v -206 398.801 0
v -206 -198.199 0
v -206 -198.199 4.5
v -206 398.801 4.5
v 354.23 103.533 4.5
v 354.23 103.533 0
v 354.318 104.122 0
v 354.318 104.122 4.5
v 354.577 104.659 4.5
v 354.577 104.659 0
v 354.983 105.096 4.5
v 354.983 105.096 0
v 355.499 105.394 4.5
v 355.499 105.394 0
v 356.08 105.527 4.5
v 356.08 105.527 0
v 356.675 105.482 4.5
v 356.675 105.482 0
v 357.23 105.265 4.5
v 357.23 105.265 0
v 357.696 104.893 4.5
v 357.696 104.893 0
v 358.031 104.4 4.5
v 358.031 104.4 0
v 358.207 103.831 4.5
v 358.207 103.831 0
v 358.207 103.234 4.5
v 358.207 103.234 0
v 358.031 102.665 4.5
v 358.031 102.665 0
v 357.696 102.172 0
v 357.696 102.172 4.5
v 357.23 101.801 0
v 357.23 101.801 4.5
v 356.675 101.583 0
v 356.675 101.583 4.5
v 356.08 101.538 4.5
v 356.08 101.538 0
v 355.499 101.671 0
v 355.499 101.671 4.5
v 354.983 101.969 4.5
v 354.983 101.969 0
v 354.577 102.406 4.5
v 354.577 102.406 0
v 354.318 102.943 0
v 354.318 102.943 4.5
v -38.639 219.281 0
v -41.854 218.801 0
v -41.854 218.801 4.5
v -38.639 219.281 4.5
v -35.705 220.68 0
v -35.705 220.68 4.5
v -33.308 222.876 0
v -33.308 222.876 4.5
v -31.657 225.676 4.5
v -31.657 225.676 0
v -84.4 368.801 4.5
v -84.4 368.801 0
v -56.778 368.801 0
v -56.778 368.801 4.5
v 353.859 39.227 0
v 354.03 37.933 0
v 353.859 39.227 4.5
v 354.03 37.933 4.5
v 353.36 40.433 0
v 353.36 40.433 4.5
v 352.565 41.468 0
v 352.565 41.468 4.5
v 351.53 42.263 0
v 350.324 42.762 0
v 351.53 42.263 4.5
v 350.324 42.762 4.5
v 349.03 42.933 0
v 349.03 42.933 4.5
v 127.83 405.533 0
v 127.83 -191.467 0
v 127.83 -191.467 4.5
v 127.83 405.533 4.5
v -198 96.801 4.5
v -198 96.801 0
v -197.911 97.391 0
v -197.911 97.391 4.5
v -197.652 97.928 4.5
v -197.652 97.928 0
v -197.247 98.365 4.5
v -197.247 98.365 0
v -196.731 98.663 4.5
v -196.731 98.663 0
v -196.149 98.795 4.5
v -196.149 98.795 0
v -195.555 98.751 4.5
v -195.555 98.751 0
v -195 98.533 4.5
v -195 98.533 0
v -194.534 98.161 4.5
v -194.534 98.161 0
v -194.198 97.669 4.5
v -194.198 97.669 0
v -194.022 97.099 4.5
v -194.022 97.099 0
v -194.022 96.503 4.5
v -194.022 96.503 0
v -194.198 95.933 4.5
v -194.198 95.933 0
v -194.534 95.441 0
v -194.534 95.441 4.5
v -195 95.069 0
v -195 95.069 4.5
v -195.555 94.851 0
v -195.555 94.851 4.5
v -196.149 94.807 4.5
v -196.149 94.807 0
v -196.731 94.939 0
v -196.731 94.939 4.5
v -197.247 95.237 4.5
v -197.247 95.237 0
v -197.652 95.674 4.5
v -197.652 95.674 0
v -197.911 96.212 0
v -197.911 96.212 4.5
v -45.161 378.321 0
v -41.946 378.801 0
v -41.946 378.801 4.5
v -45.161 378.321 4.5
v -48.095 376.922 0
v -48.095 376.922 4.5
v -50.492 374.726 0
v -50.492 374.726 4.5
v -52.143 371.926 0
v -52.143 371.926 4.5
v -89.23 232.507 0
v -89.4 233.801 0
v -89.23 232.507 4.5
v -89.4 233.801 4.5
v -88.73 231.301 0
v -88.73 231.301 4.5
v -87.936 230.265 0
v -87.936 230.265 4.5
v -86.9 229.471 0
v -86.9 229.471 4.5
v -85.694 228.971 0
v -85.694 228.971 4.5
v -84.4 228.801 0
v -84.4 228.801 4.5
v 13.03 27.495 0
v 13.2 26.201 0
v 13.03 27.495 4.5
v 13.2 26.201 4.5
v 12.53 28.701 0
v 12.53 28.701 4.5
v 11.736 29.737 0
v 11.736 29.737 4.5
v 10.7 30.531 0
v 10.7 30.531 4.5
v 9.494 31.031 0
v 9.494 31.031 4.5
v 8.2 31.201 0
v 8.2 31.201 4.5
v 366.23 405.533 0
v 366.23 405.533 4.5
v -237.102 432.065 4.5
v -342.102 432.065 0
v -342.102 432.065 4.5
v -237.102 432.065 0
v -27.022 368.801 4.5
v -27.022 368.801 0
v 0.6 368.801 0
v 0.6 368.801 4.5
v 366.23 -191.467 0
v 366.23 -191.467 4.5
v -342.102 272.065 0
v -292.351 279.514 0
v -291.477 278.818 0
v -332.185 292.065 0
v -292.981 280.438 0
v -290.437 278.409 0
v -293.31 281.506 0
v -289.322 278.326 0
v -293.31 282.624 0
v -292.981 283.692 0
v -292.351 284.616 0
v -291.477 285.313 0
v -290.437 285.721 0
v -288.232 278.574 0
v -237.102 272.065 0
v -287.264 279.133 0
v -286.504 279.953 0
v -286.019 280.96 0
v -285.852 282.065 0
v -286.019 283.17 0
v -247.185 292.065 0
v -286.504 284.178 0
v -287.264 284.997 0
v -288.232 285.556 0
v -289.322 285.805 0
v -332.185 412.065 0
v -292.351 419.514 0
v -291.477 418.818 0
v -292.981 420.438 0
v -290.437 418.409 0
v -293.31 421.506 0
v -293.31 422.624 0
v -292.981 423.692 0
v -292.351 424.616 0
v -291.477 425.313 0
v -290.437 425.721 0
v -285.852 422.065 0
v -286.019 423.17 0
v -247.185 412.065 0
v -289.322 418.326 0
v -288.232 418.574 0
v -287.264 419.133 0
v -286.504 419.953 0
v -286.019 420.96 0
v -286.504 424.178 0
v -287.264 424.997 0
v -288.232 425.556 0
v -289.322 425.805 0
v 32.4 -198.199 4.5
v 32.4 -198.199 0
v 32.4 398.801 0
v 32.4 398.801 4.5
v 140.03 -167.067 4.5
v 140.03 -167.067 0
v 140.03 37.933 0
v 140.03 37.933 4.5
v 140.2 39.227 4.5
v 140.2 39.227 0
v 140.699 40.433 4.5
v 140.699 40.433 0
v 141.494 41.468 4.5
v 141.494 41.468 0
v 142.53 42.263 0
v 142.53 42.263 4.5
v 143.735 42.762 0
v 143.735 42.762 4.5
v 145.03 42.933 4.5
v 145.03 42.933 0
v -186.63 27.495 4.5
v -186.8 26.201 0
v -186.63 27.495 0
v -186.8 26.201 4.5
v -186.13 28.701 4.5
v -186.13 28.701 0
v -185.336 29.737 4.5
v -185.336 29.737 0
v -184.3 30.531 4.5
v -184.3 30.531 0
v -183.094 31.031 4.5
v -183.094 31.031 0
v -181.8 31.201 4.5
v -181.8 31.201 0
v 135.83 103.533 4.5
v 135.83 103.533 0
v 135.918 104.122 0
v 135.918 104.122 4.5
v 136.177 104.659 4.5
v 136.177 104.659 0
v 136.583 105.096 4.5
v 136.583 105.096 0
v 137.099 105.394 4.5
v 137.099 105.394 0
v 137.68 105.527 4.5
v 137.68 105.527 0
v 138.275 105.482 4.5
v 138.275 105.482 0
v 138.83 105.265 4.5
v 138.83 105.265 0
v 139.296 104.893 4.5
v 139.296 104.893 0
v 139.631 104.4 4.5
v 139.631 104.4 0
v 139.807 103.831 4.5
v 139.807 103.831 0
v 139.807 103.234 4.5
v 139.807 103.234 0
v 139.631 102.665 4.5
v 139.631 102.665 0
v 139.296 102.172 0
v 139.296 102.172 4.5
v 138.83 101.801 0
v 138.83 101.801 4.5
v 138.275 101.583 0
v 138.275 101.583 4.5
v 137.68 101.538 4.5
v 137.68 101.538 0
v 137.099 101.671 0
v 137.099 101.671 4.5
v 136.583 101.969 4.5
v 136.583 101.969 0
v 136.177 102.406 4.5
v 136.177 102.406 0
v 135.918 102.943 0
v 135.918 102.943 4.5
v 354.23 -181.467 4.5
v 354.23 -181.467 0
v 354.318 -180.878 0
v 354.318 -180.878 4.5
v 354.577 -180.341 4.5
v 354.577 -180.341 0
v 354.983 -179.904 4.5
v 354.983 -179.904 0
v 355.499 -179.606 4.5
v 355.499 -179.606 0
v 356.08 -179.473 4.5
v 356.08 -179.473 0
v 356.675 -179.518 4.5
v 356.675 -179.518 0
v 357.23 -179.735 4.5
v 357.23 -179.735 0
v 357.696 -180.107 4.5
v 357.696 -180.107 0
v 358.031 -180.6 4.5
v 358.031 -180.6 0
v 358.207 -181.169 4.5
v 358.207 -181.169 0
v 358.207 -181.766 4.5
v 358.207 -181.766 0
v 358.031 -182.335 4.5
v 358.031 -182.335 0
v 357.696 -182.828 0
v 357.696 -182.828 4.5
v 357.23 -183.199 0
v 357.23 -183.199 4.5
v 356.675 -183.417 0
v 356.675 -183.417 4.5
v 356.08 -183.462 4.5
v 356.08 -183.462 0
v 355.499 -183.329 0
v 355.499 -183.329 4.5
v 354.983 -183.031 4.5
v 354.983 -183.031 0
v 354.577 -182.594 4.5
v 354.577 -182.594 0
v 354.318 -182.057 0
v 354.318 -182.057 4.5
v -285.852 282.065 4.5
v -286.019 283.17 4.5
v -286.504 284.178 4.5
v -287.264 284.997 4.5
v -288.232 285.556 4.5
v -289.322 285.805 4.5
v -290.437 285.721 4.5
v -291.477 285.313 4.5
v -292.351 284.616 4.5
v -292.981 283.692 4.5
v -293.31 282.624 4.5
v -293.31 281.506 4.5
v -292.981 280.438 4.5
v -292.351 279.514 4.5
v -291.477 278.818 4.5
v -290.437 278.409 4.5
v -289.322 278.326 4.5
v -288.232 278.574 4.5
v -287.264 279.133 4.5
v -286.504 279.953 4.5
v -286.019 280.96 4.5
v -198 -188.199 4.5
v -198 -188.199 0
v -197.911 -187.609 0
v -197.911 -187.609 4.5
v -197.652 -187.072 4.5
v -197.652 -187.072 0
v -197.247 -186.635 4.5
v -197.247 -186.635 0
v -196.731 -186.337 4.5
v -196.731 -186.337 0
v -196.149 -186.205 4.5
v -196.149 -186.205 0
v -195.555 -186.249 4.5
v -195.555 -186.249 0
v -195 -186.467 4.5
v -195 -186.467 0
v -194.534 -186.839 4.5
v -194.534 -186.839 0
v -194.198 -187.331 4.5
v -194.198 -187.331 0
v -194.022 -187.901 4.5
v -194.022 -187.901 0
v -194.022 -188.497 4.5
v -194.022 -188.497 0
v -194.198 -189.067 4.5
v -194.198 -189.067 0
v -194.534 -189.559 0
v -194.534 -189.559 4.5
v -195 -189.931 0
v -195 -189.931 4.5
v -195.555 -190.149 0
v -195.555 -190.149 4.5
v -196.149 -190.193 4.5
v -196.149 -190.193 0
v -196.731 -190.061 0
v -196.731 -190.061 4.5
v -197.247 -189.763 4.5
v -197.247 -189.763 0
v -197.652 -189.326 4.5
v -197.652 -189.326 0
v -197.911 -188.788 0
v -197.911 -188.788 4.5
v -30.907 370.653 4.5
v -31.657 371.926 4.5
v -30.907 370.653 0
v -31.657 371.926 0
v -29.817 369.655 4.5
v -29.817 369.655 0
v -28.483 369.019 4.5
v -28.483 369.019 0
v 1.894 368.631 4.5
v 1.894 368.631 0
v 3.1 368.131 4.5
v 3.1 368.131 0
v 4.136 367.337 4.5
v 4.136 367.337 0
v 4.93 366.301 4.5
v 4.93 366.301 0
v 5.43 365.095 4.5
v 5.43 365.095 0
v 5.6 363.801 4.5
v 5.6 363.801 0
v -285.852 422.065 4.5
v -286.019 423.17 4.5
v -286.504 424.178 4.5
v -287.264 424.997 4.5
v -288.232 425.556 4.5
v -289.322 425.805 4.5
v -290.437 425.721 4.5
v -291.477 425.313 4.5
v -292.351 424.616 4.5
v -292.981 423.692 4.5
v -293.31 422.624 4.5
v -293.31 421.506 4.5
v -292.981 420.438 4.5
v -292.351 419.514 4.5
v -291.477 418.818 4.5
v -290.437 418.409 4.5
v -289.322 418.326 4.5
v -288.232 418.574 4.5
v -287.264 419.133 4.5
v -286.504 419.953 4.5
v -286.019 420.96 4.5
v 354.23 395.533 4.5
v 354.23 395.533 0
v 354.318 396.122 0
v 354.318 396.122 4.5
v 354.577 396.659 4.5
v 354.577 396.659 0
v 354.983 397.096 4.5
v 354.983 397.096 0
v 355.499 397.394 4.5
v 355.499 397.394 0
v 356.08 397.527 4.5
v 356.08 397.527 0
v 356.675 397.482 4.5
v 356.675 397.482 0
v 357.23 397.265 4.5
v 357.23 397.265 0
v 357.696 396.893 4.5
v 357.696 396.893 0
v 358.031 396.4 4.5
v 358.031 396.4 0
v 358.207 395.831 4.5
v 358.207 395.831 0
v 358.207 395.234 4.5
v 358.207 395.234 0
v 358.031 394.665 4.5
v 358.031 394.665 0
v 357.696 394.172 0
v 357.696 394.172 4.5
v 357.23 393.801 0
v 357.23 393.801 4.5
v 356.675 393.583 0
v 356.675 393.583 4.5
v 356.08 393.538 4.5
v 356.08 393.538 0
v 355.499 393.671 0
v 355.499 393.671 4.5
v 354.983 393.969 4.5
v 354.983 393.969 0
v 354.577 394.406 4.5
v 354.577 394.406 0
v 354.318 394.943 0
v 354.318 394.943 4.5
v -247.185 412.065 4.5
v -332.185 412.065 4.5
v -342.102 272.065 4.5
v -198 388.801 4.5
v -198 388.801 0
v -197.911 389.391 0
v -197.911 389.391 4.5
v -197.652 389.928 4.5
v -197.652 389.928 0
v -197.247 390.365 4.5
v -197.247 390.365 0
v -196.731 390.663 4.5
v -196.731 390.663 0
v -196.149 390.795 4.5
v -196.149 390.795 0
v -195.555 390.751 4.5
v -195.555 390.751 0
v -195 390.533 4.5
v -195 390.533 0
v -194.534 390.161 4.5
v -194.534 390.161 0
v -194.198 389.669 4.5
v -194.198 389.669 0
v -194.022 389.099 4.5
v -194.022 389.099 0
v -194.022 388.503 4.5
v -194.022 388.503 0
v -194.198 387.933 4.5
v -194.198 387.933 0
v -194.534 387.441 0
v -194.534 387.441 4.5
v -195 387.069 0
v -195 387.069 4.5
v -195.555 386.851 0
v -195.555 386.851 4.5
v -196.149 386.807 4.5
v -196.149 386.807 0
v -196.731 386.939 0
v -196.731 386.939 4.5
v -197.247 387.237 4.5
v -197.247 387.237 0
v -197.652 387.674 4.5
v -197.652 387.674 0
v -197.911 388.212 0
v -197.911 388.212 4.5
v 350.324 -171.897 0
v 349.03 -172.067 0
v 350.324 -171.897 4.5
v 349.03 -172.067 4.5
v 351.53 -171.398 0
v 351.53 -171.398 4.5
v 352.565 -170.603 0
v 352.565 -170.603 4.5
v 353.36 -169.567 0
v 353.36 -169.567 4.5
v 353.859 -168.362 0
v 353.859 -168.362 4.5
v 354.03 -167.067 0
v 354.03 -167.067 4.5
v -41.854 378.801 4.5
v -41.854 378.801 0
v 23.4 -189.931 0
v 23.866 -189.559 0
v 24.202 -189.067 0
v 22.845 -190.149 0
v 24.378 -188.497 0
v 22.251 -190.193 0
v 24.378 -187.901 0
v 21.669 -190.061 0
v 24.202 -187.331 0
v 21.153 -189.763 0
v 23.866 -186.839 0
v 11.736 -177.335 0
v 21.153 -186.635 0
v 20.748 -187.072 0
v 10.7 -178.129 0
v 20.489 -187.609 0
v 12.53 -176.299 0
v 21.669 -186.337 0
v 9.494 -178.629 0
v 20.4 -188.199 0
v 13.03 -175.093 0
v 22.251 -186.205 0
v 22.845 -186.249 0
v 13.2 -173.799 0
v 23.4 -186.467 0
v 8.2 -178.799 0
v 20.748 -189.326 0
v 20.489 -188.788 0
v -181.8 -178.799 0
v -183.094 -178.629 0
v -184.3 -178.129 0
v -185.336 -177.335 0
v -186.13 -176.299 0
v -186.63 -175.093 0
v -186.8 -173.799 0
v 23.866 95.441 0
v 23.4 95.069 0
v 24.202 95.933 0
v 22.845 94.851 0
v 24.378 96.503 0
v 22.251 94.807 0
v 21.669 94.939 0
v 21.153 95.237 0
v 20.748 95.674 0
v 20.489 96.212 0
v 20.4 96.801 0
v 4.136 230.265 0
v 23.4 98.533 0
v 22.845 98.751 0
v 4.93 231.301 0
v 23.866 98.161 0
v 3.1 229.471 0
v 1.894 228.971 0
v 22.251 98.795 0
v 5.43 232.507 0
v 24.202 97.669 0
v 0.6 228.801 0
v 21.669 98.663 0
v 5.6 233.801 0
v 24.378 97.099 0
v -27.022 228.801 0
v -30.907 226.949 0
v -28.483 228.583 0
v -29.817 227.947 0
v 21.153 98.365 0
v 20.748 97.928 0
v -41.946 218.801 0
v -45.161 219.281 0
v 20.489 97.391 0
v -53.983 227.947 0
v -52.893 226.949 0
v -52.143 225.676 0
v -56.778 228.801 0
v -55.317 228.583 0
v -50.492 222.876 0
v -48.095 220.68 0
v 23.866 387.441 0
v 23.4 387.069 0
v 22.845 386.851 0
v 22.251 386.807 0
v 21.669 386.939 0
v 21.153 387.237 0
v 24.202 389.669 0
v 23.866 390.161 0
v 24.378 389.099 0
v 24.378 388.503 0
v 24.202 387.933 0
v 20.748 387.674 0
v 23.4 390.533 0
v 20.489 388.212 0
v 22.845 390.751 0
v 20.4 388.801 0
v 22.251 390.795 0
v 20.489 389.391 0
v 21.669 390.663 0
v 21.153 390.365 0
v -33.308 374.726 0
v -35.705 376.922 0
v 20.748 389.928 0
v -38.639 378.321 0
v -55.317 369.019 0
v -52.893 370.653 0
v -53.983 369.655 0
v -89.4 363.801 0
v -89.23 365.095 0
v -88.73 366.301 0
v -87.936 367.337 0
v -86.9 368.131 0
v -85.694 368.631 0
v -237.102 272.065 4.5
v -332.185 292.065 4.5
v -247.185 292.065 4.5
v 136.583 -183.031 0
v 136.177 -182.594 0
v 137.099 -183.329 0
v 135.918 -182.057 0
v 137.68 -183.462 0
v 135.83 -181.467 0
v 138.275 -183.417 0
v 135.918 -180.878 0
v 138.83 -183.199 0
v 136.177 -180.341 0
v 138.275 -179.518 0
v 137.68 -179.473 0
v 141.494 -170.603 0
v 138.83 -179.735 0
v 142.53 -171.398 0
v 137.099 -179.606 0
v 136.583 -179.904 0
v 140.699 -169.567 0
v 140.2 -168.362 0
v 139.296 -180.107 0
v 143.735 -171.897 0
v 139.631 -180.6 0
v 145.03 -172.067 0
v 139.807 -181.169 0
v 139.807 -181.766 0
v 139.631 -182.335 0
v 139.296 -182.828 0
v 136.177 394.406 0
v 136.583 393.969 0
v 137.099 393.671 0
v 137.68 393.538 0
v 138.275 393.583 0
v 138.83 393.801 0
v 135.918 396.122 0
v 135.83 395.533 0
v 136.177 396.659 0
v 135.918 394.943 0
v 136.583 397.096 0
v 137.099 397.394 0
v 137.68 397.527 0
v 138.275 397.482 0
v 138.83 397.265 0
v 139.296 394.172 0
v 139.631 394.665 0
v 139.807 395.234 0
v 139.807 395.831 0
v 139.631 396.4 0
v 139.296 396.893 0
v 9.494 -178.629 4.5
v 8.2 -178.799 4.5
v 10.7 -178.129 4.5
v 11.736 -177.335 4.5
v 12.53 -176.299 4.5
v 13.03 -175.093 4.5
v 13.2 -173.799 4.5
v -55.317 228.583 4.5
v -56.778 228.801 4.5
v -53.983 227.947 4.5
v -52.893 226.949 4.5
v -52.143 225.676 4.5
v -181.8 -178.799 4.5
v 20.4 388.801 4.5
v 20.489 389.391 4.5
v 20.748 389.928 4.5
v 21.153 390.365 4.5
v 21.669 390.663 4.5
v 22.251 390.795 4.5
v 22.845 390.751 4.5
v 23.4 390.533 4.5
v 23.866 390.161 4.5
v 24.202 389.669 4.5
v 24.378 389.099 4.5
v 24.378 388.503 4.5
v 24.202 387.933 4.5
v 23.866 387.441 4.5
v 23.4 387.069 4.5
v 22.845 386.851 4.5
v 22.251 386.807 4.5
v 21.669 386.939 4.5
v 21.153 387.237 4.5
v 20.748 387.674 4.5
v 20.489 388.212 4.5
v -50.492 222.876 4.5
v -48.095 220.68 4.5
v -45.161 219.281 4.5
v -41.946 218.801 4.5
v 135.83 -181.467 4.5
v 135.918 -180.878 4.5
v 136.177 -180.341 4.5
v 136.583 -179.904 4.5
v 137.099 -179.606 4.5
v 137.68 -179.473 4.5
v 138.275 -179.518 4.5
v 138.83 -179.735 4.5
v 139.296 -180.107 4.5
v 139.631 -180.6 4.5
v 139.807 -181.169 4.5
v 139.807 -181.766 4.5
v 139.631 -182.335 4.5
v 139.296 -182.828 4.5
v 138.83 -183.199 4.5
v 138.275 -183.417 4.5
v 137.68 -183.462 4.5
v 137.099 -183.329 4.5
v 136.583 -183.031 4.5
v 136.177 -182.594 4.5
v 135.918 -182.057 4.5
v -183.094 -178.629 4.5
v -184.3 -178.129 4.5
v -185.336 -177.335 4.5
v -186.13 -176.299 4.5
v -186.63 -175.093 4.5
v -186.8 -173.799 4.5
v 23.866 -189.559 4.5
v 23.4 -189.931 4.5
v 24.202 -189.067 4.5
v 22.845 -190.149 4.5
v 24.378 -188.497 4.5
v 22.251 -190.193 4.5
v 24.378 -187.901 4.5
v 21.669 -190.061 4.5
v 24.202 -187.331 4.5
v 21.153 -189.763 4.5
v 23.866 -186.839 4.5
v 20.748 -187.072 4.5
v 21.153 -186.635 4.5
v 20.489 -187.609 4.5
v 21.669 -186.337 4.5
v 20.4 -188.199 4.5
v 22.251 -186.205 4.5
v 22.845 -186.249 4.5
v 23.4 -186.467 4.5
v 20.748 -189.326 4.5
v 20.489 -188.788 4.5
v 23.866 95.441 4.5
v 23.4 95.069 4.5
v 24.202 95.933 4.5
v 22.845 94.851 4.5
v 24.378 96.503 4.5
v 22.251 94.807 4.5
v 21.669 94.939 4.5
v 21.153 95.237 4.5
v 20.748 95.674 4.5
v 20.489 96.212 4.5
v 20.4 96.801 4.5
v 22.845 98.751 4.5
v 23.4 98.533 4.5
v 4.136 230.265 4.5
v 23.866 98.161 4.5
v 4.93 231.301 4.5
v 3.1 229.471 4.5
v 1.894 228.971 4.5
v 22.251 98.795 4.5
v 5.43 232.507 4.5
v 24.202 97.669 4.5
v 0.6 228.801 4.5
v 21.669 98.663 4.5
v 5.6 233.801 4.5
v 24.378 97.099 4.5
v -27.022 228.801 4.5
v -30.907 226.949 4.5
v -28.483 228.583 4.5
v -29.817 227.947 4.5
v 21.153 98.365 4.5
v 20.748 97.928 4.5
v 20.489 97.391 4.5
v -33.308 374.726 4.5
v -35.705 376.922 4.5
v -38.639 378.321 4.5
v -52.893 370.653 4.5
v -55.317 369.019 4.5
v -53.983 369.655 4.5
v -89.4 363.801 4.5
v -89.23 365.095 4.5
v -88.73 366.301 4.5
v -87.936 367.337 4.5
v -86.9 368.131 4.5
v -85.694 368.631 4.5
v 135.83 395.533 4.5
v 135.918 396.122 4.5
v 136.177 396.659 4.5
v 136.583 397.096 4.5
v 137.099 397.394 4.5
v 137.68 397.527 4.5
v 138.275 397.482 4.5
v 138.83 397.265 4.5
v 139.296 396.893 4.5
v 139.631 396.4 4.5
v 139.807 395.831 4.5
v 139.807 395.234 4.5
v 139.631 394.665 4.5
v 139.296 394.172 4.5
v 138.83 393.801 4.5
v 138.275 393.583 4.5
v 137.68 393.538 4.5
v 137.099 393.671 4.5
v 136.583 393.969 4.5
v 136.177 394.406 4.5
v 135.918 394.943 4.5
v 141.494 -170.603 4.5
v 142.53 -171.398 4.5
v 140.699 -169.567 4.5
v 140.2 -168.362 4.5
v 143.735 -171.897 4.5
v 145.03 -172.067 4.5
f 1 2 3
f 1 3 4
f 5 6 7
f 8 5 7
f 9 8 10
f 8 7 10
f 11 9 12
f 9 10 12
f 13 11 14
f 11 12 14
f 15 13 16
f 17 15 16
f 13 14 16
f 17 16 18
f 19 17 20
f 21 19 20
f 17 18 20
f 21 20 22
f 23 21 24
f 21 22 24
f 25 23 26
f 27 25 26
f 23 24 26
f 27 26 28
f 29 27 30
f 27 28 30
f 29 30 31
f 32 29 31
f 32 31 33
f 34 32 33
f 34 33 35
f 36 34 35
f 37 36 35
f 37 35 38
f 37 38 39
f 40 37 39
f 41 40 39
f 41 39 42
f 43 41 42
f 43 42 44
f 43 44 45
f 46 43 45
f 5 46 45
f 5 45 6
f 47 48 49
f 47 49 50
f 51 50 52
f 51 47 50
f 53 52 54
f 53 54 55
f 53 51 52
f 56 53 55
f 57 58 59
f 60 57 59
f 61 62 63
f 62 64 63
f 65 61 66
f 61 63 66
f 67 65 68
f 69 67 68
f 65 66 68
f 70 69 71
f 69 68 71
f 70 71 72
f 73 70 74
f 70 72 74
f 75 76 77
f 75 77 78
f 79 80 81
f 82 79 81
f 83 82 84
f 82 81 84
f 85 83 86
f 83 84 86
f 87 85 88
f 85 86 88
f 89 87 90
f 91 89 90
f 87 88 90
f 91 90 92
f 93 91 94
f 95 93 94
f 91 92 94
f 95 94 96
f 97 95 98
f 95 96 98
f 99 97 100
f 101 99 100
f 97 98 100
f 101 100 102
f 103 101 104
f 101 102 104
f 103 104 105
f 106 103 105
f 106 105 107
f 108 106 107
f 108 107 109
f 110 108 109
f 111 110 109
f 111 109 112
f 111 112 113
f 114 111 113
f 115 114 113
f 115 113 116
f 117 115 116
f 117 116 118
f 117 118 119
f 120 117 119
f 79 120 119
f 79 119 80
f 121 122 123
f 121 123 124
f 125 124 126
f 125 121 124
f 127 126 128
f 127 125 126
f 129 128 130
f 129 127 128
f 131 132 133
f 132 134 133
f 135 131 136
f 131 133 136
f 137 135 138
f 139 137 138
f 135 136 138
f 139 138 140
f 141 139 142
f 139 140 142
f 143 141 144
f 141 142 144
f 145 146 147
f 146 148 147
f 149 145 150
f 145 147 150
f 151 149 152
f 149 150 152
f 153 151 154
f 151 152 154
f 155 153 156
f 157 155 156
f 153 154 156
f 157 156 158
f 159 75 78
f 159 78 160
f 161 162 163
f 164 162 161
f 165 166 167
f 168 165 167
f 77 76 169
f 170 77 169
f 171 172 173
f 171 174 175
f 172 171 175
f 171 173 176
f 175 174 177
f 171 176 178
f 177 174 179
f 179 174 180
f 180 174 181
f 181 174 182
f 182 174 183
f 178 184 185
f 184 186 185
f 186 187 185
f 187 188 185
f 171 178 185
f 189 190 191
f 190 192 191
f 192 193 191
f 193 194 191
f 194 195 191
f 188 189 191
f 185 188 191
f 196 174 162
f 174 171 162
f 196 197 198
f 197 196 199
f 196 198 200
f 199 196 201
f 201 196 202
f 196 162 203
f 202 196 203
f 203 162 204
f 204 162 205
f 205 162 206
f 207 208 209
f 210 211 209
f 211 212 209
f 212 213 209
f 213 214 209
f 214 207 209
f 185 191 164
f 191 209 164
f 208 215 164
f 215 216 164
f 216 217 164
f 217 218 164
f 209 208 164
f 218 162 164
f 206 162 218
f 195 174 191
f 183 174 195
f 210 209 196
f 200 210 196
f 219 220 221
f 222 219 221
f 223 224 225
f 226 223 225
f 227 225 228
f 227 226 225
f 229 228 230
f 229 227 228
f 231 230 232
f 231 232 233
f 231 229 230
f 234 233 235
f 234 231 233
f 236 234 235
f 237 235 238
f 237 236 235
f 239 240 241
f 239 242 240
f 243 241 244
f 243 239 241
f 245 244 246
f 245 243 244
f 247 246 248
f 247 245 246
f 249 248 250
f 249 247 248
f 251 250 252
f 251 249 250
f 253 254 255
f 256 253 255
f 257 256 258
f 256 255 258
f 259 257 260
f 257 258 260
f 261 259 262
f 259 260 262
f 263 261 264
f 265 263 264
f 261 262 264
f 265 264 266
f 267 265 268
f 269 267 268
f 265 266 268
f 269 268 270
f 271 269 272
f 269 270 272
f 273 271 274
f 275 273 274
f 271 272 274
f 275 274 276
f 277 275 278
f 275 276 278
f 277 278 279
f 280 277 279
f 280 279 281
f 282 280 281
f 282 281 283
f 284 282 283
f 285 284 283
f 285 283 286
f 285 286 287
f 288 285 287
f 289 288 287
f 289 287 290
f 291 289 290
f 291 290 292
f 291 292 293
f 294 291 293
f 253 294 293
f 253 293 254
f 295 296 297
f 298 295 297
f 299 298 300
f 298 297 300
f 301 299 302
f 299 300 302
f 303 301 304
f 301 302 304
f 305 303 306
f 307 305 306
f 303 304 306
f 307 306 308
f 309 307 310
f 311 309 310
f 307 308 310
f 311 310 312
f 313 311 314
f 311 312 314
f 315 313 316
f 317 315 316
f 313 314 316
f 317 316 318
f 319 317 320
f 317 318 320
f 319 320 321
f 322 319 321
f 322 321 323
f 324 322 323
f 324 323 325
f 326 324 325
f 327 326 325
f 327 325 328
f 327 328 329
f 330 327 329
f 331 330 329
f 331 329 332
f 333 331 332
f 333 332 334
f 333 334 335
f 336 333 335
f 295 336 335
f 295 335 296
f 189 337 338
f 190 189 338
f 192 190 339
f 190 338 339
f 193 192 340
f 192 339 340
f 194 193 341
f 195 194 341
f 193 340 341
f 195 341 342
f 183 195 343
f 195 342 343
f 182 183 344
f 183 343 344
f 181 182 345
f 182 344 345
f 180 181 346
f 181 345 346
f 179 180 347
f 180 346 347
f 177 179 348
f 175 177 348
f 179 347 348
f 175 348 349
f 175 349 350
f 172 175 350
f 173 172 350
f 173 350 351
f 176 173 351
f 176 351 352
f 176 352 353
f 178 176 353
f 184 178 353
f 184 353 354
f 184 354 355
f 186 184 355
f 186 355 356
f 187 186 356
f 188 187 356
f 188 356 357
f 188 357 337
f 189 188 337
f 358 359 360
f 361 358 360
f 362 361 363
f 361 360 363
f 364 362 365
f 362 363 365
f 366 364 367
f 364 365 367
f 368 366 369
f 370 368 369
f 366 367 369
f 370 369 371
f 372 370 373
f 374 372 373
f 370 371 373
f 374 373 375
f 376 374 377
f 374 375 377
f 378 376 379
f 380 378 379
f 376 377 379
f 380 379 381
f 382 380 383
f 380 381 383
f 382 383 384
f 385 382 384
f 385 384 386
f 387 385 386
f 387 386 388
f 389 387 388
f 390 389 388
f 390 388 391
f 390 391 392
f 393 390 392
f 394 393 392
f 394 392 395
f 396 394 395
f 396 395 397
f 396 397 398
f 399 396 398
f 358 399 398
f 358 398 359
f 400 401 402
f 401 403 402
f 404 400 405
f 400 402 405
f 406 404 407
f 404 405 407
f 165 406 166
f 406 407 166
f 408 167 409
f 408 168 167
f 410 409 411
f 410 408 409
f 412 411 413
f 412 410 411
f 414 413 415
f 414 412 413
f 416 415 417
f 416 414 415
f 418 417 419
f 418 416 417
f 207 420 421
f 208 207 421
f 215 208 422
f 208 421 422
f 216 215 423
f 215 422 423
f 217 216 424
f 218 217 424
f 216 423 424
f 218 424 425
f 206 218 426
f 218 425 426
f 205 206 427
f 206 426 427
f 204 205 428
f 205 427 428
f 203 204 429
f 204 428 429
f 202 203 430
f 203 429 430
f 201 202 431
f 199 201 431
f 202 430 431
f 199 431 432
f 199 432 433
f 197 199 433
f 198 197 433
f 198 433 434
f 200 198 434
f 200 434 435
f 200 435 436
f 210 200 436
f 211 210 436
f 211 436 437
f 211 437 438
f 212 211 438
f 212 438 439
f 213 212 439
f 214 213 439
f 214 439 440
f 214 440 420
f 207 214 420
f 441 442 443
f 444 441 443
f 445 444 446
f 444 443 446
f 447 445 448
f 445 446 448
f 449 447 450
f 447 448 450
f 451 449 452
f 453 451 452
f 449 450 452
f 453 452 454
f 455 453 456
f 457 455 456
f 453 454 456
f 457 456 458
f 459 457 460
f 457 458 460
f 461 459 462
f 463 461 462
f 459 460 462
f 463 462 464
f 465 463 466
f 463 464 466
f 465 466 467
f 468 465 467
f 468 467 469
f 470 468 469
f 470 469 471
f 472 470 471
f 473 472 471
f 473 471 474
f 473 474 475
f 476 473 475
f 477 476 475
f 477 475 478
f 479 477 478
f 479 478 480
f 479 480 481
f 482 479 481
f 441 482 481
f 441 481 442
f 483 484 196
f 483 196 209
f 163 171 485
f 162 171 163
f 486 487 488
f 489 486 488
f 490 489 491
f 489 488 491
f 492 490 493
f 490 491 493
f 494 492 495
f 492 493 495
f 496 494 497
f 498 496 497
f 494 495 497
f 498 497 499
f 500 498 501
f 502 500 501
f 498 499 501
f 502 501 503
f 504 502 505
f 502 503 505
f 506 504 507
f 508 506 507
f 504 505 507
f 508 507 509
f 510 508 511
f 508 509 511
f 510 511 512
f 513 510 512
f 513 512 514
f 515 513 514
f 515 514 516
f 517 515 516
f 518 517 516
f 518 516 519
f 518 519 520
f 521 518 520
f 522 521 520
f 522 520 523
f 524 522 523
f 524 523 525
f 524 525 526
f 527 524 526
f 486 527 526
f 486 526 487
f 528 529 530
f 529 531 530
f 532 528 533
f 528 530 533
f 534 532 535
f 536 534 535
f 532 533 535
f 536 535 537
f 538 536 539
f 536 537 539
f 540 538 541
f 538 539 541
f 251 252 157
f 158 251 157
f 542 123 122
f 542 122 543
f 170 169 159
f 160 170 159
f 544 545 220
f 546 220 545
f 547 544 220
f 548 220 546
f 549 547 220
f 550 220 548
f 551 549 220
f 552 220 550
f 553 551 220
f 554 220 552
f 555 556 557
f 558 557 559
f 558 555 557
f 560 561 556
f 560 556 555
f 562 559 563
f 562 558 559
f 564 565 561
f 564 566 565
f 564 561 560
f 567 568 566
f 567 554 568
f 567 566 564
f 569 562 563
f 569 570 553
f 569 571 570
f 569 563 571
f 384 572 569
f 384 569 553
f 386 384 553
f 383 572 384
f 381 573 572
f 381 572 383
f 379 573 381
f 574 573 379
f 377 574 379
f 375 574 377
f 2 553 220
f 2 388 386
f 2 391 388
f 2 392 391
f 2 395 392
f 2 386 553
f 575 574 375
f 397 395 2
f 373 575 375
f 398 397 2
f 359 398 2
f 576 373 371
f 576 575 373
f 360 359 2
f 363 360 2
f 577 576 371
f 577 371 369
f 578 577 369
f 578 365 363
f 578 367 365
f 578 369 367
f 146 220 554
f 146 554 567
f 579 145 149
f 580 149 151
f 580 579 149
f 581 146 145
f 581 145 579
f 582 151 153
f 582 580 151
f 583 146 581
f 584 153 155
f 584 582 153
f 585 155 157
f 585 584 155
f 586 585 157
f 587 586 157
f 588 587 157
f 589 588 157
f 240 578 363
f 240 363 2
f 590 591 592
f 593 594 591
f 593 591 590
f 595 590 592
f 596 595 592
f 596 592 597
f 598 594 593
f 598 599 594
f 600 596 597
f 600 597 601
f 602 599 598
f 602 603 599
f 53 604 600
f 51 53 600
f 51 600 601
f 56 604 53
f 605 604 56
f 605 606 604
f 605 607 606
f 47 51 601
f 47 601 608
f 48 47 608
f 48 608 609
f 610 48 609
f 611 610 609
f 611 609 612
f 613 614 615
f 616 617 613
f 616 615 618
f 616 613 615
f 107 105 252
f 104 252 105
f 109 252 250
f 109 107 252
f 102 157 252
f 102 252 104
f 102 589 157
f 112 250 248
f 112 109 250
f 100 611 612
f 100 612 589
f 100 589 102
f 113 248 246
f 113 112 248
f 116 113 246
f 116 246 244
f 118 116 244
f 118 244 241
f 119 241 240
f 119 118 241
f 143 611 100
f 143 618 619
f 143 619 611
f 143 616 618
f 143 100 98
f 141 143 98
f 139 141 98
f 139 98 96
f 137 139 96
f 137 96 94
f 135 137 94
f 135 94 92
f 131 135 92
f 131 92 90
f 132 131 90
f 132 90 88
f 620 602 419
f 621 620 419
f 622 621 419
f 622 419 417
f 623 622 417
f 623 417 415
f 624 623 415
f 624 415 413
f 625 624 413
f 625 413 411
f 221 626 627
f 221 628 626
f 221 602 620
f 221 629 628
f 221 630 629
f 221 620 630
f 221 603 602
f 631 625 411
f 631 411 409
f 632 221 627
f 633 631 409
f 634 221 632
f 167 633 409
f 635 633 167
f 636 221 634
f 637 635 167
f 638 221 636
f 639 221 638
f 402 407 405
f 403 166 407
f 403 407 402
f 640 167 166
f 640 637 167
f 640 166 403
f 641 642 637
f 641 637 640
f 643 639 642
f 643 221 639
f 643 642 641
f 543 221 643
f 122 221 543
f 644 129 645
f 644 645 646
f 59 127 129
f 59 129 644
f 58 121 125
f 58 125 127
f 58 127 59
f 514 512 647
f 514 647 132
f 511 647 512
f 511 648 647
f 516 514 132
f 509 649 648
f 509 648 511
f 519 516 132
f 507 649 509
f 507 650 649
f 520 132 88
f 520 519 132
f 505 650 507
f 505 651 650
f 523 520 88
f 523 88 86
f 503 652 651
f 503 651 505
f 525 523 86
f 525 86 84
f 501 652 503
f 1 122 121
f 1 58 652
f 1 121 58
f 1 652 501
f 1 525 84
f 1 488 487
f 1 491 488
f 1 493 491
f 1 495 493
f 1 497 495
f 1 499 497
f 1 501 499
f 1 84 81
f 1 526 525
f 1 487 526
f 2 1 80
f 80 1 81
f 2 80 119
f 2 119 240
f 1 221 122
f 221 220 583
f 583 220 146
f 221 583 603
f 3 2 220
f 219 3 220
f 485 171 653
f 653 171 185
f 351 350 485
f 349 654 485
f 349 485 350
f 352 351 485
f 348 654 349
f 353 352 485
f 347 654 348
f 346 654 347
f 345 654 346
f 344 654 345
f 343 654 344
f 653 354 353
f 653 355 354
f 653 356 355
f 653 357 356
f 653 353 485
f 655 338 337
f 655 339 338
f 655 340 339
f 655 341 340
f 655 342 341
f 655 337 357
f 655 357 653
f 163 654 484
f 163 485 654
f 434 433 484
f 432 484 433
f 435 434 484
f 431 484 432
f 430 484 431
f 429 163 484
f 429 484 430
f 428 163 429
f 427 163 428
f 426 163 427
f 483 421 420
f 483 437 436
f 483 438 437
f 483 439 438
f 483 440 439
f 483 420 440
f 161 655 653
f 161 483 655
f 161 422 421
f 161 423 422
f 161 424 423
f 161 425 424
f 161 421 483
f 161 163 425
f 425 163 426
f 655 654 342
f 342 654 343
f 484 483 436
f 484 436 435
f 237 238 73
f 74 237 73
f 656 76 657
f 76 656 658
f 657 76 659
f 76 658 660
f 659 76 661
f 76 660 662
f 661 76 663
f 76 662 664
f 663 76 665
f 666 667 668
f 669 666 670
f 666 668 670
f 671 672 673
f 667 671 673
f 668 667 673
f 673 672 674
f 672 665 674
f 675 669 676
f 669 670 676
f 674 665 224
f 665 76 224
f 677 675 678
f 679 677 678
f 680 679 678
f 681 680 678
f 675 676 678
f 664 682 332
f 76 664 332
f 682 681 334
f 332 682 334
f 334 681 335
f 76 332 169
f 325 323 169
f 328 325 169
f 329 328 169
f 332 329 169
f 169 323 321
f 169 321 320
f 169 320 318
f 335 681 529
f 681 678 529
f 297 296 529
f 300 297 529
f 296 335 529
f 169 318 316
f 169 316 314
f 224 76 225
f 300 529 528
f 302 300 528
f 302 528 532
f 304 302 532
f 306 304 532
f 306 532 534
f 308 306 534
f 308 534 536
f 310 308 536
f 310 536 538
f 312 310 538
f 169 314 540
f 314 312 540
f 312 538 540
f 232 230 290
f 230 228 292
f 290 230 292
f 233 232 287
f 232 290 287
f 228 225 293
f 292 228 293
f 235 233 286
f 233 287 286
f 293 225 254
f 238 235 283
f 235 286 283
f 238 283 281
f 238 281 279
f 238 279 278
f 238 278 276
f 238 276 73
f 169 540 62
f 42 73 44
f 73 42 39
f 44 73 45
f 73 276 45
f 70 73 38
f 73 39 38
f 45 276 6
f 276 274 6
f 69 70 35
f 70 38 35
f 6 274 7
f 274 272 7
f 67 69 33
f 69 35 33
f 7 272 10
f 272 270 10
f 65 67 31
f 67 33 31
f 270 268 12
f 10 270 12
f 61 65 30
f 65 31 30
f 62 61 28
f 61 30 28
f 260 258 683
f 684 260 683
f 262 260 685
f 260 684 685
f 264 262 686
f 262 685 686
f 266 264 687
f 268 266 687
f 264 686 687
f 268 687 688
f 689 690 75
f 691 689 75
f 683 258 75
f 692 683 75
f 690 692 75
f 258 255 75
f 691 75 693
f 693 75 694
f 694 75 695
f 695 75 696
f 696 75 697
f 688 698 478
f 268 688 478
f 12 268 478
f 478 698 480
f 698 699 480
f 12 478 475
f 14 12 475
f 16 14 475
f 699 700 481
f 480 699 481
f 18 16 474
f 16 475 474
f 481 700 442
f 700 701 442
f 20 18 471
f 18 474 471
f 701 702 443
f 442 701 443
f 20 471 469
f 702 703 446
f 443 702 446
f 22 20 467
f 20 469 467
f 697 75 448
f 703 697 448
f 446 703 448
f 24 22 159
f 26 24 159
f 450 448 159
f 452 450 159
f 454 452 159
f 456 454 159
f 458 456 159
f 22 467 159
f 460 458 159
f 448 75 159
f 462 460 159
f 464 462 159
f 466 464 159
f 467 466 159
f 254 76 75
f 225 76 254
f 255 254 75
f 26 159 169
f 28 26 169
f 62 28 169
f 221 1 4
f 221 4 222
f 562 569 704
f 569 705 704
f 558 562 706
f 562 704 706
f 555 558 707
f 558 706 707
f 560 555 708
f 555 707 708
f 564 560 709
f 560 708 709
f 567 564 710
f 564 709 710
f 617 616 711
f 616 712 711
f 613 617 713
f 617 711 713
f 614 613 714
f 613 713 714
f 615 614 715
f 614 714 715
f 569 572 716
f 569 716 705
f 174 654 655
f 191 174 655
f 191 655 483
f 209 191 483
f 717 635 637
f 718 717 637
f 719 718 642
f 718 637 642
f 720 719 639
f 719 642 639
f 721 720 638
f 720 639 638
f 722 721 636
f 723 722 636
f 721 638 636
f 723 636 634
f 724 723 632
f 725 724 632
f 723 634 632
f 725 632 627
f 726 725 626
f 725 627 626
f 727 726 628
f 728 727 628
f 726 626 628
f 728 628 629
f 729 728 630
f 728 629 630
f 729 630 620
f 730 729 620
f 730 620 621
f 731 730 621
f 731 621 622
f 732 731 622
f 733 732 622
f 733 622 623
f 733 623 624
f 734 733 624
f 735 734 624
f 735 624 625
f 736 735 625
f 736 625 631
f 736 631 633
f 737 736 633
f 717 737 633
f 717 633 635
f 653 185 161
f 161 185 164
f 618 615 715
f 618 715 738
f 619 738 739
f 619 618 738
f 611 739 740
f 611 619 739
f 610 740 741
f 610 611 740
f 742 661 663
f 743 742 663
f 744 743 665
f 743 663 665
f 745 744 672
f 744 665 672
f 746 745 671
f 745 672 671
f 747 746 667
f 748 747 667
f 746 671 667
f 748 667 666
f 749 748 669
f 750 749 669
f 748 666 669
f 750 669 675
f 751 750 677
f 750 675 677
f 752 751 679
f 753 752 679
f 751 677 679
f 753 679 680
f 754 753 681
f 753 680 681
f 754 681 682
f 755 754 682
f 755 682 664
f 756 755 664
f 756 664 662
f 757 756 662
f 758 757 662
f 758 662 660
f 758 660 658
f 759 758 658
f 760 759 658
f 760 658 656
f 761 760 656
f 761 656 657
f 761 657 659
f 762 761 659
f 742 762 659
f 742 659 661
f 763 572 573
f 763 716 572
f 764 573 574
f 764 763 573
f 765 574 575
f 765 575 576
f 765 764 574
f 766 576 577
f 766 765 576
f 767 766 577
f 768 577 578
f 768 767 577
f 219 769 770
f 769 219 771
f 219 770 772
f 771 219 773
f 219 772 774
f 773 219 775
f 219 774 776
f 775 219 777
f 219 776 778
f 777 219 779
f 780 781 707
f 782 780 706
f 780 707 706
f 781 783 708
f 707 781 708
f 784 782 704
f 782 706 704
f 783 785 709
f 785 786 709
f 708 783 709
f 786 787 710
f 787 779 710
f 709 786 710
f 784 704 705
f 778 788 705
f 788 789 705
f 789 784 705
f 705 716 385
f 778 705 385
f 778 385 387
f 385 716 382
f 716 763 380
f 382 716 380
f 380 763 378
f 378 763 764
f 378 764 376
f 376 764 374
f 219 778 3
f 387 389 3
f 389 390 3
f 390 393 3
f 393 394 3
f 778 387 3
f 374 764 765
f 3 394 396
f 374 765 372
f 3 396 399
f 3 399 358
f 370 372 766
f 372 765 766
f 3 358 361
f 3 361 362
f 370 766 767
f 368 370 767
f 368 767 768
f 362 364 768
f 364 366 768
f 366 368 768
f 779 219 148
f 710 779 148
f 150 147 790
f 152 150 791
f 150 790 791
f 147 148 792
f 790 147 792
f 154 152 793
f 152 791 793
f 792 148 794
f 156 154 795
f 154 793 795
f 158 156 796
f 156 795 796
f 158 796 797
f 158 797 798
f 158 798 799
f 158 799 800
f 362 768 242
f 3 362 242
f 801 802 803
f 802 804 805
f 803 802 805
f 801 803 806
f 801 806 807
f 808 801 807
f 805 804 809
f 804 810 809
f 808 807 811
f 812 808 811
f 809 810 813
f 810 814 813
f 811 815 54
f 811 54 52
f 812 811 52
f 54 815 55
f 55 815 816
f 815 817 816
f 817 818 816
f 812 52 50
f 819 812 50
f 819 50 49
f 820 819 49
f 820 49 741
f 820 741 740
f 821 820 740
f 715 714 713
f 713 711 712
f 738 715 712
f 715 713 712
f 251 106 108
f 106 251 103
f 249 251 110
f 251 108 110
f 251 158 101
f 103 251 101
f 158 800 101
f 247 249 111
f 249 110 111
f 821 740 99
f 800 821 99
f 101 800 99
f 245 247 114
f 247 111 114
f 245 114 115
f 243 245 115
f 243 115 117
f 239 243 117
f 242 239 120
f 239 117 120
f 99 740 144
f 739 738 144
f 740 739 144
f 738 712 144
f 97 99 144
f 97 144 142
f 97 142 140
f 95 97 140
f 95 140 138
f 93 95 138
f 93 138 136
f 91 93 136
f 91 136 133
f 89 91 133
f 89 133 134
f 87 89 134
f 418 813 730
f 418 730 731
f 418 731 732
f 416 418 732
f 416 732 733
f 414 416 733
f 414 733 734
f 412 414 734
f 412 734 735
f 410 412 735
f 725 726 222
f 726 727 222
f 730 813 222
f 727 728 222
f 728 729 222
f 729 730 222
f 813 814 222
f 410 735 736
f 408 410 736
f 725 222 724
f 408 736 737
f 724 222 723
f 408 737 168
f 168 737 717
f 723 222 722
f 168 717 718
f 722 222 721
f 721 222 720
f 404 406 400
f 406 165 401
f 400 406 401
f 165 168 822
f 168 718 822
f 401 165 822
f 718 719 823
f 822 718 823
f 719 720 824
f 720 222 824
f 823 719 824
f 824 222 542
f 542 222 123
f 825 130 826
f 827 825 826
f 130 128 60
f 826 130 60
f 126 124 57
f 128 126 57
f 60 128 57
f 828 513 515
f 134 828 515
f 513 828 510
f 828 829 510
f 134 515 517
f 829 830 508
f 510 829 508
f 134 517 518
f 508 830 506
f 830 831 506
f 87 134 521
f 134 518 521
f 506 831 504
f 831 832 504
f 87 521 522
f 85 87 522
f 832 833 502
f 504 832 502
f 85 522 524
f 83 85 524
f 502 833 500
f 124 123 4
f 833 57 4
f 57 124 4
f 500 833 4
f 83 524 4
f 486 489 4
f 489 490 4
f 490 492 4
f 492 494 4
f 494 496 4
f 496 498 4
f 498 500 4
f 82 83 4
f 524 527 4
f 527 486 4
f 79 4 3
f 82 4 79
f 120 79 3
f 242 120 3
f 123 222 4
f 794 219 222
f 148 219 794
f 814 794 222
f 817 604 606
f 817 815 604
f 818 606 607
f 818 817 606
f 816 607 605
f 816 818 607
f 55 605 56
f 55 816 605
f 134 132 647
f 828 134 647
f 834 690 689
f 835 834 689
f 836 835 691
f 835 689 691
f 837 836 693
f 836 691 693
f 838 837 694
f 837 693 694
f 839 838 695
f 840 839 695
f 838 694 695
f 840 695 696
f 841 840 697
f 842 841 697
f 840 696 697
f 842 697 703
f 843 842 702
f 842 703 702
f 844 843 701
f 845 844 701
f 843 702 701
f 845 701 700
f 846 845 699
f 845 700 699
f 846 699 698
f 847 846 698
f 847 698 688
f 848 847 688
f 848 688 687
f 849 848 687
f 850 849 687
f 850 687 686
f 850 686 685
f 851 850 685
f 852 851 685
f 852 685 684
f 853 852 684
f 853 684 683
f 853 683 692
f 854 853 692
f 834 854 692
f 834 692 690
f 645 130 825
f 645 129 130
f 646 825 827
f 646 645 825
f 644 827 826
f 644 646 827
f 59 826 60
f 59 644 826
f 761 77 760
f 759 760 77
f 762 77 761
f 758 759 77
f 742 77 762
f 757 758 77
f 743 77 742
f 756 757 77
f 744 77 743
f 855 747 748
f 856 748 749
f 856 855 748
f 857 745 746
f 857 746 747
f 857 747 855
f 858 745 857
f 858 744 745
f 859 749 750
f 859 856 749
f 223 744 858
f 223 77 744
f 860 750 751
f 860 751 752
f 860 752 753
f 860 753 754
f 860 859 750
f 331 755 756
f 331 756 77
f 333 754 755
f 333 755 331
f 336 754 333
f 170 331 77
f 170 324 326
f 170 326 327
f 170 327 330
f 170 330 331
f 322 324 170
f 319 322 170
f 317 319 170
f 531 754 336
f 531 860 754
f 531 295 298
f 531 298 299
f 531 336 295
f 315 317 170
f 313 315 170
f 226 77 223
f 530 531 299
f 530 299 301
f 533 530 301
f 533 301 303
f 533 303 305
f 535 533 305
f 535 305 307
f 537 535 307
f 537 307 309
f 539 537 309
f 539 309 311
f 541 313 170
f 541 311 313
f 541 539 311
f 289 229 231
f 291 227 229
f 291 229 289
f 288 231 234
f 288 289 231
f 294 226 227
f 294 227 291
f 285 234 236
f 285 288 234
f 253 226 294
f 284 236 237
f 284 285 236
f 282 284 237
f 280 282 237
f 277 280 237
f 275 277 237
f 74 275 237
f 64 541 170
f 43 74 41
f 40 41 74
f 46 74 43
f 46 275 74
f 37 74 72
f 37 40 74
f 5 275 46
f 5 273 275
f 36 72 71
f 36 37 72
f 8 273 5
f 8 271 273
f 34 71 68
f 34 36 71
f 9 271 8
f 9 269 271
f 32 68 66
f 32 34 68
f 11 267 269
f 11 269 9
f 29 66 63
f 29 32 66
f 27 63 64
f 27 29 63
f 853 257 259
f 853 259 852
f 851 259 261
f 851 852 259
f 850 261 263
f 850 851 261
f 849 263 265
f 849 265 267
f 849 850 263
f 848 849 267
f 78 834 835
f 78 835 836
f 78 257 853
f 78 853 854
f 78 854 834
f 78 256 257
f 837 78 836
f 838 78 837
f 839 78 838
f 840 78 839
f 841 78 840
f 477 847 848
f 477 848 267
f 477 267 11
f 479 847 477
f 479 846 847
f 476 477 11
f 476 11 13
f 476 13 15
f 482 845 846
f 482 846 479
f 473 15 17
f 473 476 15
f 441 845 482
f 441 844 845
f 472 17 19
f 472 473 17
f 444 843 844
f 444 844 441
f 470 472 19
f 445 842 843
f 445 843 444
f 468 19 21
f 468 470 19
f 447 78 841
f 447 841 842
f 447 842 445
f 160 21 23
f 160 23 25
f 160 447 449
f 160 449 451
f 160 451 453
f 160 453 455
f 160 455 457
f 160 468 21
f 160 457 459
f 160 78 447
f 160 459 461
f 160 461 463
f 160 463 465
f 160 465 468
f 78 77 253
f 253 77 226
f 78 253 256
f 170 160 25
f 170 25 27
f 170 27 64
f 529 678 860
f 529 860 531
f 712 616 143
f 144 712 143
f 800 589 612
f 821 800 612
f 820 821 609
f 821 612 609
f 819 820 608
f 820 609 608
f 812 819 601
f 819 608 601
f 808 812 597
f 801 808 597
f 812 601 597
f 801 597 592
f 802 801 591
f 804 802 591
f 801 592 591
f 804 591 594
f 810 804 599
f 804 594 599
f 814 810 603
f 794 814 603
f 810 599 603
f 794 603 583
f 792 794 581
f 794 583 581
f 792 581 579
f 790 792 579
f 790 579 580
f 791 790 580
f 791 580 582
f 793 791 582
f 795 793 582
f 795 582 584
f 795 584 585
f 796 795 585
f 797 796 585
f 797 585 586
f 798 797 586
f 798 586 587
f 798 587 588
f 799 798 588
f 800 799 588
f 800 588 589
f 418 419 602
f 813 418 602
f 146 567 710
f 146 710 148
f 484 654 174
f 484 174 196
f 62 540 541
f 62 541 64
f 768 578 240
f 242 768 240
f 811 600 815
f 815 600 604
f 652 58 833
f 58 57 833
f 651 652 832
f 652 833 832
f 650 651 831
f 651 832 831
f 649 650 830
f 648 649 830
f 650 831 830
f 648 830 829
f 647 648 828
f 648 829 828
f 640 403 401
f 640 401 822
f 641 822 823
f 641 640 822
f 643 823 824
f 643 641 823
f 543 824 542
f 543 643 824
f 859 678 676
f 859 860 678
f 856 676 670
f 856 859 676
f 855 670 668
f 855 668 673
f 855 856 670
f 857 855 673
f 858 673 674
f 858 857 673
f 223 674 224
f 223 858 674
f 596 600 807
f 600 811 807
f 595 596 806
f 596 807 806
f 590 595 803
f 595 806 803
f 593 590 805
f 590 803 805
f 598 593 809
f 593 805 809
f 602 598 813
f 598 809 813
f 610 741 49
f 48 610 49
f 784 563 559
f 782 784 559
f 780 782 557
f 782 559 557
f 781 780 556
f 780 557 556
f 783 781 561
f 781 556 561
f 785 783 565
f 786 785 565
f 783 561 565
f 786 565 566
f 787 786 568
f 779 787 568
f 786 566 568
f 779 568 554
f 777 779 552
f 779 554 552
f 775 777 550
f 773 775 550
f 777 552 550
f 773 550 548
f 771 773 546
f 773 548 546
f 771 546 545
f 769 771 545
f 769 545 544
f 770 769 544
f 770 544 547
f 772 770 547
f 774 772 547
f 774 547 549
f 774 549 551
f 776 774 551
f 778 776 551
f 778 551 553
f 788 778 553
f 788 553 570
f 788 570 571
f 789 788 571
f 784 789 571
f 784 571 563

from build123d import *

# Parameters (mm, degrees)
F0_W         = 238.4
F0_H         = 597
F0_W_2       = 200
F0_H_2       = 210
F1_DEPTH     = 4.5
F3_D         = 4
F4_W         = 238.4
F4_H         = 597
F4_W_2       = 214
F4_H_2       = 215
F5_DEPTH     = 4.5
F7_D         = 4
F8_R         = 5
F9_R         = 5
F10_R        = 5
F11_W        = 105
F11_H        = 160
F12_DEPTH    = 4.5
F13_W        = 85
F13_H        = 120
F13_R        = 3.75
F14_DEPTH    = 25
F15_W        = 22
F15_H        = 160
F16_DEPTH    = 25
F17_T1_DEPTH = 4.5
F18_R        = 5


# Not quite as in the source:
# - a fillet or chamfer that OpenCascade refuses, or shapes differently, is made with other operations: its cross-section is extruded or revolved along the edge and cut away or added


with BuildPart() as f1:
    # F0 (on Top) → F1 (new body)
    with BuildSketch(Plane.XY):
        with Locations((-86.8, 100.3010249138)):
            Rectangle(F0_W, F0_H)
        with Locations((-86.8, -73.7989750862)):
            Rectangle(F0_W_2, F0_H_2, mode=Mode.SUBTRACT)
        with BuildLine():
            ThreePointArc((-52.6800657034, 368.8010249138), (-49.4800657034, 372.0010249138), (-46.2800657034, 368.8010249138))
            Line((-46.2800657034, 368.8010249138), (5.6, 368.8010249138))
            Line((5.6, 368.8010249138), (5.6, 228.8010249138))
            Line((5.6, 228.8010249138), (-89.4, 228.8010249138))
            Line((-89.4, 228.8010249138), (-89.4, 368.8010249138))
            Line((-89.4, 368.8010249138), (-52.6800657034, 368.8010249138))
        make_face(mode=Mode.SUBTRACT)
    extrude(amount=F1_DEPTH)

    # F3 (through all)
    with Locations(Plane.XY.offset(4.5)):
        with Locations((-196, 388.8010249138), (22.4, 388.8010249138), (22.4, 96.8010249138), (-196, 96.8010249138), (-196, -188.1989750862), (22.4, -188.1989750862)):
            Hole(F3_D / 2)

    # F9
    f9_edges = [f1.edges().sort_by_distance(p)[0] for p in [
        (13.2, 31.201025, 2.25),
        (-186.8, 31.201025, 2.25),
        (13.2, -178.798975, 2.25),
        (-186.8, -178.798975, 2.25),
    ]]
    fillet(f9_edges, radius=F9_R)

    # F10
    f10_edges = [f1.edges().sort_by_distance(p)[0] for p in [
        (-89.4, 368.801025, 2.25),
        (5.6, 368.801025, 2.25),
        (5.6, 228.801025, 2.25),
        (-89.4, 228.801025, 2.25),
    ]]
    fillet(f10_edges, radius=F10_R)

    # F15 (on face) → F16 (cut)
    with BuildSketch(Plane.XY.offset(4.5)):
        with Locations((-41.9, 298.8010249138)):
            Rectangle(F15_W, F15_H)
    extrude(amount=-F16_DEPTH, mode=Mode.SUBTRACT)

    # F17: fillet of radius 11 on 4 edges, made by hand

    # F17_s2 → F17_t1 (join)
    with BuildSketch(Plane.XY):
        with BuildLine():
            ThreePointArc((-30.9, 368.8010249138), (-34.438252663, 375.9250633184), (-41.8544511501, 378.8010249138))
            Line((-41.8544511501, 378.8010249138), (-30.9, 378.8010249138))
            Line((-30.9, 378.8010249138), (-30.9, 368.8010249138))
        make_face()
        with BuildLine():
            ThreePointArc((-41.9455488499, 378.8010249138), (-49.361747337, 375.9250633184), (-52.9, 368.8010249138))
            Line((-52.9, 368.8010249138), (-52.9, 378.8010249138))
            Line((-52.9, 378.8010249138), (-41.9455488499, 378.8010249138))
        make_face()
        with BuildLine():
            ThreePointArc((-52.9, 228.8010249138), (-49.361747337, 221.6769865092), (-41.9455488499, 218.8010249138))
            Line((-41.9455488499, 218.8010249138), (-52.9, 218.8010249138))
            Line((-52.9, 218.8010249138), (-52.9, 228.8010249138))
        make_face()
        with BuildLine():
            ThreePointArc((-41.8544511501, 218.8010249138), (-34.438252663, 221.6769865092), (-30.9, 228.8010249138))
            Line((-30.9, 228.8010249138), (-30.9, 218.8010249138))
            Line((-30.9, 218.8010249138), (-41.8544511501, 218.8010249138))
        make_face()
    extrude(amount=F17_T1_DEPTH)

    # F18
    f18_edges = [f1.edges().sort_by_distance(p)[0] for p in [
        (-52.9, 368.801025, 2.25),
        (-30.9, 368.801025, 2.25),
        (-30.9, 228.801025, 2.25),
        (-52.9, 228.801025, 2.25),
    ]]
    fillet(f18_edges, radius=F18_R)


with BuildPart() as f5:
    # F4 (on Top) → F5 (new body)
    with BuildSketch(Plane.XY):
        with Locations((247.0295269012, 107.0325807333)):
            Rectangle(F4_W, F4_H)
        with Locations((247.0295269012, -64.5674192667)):
            Rectangle(F4_W_2, F4_H_2, mode=Mode.SUBTRACT)
    extrude(amount=F5_DEPTH)

    # F7 (through all)
    with Locations(Plane.XY.offset(4.5)):
        with Locations((137.8295269012, 395.5325807333), (356.2295269012, 395.5325807333), (356.2295269012, 103.5325807333), (137.8295269012, 103.5325807333), (137.8295269012, -181.4674192667), (356.2295269012, -181.4674192667)):
            Hole(F7_D / 2)

    # F8
    f8_edges = [f5.edges().sort_by_distance(p)[0] for p in [
        (354.029527, 42.932581, 2.25),
        (140.029527, 42.932581, 2.25),
        (354.029527, -172.067419, 2.25),
        (140.029527, -172.067419, 2.25),
    ]]
    fillet(f8_edges, radius=F8_R)


with BuildPart() as f12:
    # F11 (on Top) → F12 (new body)
    with BuildSketch(Plane.XY):
        with Locations((-289.6022295952, 352.065103054)):
            Rectangle(F11_W, F11_H)
    extrude(amount=F12_DEPTH)

    # F13 (on face) → F14 (cut)
    with BuildSketch(Plane.XY.offset(4.5)):
        with Locations((-289.6849620342, 352.065103054)):
            Rectangle(F13_W, F13_H)
        with Locations((-289.6022295952, 422.065103054)):
            Circle(F13_R)
        with Locations((-289.6022295952, 282.065103054)):
            Circle(F13_R)
    extrude(amount=-F14_DEPTH, mode=Mode.SUBTRACT)


solid = Compound([f1.part, f5.part, f12.part])
